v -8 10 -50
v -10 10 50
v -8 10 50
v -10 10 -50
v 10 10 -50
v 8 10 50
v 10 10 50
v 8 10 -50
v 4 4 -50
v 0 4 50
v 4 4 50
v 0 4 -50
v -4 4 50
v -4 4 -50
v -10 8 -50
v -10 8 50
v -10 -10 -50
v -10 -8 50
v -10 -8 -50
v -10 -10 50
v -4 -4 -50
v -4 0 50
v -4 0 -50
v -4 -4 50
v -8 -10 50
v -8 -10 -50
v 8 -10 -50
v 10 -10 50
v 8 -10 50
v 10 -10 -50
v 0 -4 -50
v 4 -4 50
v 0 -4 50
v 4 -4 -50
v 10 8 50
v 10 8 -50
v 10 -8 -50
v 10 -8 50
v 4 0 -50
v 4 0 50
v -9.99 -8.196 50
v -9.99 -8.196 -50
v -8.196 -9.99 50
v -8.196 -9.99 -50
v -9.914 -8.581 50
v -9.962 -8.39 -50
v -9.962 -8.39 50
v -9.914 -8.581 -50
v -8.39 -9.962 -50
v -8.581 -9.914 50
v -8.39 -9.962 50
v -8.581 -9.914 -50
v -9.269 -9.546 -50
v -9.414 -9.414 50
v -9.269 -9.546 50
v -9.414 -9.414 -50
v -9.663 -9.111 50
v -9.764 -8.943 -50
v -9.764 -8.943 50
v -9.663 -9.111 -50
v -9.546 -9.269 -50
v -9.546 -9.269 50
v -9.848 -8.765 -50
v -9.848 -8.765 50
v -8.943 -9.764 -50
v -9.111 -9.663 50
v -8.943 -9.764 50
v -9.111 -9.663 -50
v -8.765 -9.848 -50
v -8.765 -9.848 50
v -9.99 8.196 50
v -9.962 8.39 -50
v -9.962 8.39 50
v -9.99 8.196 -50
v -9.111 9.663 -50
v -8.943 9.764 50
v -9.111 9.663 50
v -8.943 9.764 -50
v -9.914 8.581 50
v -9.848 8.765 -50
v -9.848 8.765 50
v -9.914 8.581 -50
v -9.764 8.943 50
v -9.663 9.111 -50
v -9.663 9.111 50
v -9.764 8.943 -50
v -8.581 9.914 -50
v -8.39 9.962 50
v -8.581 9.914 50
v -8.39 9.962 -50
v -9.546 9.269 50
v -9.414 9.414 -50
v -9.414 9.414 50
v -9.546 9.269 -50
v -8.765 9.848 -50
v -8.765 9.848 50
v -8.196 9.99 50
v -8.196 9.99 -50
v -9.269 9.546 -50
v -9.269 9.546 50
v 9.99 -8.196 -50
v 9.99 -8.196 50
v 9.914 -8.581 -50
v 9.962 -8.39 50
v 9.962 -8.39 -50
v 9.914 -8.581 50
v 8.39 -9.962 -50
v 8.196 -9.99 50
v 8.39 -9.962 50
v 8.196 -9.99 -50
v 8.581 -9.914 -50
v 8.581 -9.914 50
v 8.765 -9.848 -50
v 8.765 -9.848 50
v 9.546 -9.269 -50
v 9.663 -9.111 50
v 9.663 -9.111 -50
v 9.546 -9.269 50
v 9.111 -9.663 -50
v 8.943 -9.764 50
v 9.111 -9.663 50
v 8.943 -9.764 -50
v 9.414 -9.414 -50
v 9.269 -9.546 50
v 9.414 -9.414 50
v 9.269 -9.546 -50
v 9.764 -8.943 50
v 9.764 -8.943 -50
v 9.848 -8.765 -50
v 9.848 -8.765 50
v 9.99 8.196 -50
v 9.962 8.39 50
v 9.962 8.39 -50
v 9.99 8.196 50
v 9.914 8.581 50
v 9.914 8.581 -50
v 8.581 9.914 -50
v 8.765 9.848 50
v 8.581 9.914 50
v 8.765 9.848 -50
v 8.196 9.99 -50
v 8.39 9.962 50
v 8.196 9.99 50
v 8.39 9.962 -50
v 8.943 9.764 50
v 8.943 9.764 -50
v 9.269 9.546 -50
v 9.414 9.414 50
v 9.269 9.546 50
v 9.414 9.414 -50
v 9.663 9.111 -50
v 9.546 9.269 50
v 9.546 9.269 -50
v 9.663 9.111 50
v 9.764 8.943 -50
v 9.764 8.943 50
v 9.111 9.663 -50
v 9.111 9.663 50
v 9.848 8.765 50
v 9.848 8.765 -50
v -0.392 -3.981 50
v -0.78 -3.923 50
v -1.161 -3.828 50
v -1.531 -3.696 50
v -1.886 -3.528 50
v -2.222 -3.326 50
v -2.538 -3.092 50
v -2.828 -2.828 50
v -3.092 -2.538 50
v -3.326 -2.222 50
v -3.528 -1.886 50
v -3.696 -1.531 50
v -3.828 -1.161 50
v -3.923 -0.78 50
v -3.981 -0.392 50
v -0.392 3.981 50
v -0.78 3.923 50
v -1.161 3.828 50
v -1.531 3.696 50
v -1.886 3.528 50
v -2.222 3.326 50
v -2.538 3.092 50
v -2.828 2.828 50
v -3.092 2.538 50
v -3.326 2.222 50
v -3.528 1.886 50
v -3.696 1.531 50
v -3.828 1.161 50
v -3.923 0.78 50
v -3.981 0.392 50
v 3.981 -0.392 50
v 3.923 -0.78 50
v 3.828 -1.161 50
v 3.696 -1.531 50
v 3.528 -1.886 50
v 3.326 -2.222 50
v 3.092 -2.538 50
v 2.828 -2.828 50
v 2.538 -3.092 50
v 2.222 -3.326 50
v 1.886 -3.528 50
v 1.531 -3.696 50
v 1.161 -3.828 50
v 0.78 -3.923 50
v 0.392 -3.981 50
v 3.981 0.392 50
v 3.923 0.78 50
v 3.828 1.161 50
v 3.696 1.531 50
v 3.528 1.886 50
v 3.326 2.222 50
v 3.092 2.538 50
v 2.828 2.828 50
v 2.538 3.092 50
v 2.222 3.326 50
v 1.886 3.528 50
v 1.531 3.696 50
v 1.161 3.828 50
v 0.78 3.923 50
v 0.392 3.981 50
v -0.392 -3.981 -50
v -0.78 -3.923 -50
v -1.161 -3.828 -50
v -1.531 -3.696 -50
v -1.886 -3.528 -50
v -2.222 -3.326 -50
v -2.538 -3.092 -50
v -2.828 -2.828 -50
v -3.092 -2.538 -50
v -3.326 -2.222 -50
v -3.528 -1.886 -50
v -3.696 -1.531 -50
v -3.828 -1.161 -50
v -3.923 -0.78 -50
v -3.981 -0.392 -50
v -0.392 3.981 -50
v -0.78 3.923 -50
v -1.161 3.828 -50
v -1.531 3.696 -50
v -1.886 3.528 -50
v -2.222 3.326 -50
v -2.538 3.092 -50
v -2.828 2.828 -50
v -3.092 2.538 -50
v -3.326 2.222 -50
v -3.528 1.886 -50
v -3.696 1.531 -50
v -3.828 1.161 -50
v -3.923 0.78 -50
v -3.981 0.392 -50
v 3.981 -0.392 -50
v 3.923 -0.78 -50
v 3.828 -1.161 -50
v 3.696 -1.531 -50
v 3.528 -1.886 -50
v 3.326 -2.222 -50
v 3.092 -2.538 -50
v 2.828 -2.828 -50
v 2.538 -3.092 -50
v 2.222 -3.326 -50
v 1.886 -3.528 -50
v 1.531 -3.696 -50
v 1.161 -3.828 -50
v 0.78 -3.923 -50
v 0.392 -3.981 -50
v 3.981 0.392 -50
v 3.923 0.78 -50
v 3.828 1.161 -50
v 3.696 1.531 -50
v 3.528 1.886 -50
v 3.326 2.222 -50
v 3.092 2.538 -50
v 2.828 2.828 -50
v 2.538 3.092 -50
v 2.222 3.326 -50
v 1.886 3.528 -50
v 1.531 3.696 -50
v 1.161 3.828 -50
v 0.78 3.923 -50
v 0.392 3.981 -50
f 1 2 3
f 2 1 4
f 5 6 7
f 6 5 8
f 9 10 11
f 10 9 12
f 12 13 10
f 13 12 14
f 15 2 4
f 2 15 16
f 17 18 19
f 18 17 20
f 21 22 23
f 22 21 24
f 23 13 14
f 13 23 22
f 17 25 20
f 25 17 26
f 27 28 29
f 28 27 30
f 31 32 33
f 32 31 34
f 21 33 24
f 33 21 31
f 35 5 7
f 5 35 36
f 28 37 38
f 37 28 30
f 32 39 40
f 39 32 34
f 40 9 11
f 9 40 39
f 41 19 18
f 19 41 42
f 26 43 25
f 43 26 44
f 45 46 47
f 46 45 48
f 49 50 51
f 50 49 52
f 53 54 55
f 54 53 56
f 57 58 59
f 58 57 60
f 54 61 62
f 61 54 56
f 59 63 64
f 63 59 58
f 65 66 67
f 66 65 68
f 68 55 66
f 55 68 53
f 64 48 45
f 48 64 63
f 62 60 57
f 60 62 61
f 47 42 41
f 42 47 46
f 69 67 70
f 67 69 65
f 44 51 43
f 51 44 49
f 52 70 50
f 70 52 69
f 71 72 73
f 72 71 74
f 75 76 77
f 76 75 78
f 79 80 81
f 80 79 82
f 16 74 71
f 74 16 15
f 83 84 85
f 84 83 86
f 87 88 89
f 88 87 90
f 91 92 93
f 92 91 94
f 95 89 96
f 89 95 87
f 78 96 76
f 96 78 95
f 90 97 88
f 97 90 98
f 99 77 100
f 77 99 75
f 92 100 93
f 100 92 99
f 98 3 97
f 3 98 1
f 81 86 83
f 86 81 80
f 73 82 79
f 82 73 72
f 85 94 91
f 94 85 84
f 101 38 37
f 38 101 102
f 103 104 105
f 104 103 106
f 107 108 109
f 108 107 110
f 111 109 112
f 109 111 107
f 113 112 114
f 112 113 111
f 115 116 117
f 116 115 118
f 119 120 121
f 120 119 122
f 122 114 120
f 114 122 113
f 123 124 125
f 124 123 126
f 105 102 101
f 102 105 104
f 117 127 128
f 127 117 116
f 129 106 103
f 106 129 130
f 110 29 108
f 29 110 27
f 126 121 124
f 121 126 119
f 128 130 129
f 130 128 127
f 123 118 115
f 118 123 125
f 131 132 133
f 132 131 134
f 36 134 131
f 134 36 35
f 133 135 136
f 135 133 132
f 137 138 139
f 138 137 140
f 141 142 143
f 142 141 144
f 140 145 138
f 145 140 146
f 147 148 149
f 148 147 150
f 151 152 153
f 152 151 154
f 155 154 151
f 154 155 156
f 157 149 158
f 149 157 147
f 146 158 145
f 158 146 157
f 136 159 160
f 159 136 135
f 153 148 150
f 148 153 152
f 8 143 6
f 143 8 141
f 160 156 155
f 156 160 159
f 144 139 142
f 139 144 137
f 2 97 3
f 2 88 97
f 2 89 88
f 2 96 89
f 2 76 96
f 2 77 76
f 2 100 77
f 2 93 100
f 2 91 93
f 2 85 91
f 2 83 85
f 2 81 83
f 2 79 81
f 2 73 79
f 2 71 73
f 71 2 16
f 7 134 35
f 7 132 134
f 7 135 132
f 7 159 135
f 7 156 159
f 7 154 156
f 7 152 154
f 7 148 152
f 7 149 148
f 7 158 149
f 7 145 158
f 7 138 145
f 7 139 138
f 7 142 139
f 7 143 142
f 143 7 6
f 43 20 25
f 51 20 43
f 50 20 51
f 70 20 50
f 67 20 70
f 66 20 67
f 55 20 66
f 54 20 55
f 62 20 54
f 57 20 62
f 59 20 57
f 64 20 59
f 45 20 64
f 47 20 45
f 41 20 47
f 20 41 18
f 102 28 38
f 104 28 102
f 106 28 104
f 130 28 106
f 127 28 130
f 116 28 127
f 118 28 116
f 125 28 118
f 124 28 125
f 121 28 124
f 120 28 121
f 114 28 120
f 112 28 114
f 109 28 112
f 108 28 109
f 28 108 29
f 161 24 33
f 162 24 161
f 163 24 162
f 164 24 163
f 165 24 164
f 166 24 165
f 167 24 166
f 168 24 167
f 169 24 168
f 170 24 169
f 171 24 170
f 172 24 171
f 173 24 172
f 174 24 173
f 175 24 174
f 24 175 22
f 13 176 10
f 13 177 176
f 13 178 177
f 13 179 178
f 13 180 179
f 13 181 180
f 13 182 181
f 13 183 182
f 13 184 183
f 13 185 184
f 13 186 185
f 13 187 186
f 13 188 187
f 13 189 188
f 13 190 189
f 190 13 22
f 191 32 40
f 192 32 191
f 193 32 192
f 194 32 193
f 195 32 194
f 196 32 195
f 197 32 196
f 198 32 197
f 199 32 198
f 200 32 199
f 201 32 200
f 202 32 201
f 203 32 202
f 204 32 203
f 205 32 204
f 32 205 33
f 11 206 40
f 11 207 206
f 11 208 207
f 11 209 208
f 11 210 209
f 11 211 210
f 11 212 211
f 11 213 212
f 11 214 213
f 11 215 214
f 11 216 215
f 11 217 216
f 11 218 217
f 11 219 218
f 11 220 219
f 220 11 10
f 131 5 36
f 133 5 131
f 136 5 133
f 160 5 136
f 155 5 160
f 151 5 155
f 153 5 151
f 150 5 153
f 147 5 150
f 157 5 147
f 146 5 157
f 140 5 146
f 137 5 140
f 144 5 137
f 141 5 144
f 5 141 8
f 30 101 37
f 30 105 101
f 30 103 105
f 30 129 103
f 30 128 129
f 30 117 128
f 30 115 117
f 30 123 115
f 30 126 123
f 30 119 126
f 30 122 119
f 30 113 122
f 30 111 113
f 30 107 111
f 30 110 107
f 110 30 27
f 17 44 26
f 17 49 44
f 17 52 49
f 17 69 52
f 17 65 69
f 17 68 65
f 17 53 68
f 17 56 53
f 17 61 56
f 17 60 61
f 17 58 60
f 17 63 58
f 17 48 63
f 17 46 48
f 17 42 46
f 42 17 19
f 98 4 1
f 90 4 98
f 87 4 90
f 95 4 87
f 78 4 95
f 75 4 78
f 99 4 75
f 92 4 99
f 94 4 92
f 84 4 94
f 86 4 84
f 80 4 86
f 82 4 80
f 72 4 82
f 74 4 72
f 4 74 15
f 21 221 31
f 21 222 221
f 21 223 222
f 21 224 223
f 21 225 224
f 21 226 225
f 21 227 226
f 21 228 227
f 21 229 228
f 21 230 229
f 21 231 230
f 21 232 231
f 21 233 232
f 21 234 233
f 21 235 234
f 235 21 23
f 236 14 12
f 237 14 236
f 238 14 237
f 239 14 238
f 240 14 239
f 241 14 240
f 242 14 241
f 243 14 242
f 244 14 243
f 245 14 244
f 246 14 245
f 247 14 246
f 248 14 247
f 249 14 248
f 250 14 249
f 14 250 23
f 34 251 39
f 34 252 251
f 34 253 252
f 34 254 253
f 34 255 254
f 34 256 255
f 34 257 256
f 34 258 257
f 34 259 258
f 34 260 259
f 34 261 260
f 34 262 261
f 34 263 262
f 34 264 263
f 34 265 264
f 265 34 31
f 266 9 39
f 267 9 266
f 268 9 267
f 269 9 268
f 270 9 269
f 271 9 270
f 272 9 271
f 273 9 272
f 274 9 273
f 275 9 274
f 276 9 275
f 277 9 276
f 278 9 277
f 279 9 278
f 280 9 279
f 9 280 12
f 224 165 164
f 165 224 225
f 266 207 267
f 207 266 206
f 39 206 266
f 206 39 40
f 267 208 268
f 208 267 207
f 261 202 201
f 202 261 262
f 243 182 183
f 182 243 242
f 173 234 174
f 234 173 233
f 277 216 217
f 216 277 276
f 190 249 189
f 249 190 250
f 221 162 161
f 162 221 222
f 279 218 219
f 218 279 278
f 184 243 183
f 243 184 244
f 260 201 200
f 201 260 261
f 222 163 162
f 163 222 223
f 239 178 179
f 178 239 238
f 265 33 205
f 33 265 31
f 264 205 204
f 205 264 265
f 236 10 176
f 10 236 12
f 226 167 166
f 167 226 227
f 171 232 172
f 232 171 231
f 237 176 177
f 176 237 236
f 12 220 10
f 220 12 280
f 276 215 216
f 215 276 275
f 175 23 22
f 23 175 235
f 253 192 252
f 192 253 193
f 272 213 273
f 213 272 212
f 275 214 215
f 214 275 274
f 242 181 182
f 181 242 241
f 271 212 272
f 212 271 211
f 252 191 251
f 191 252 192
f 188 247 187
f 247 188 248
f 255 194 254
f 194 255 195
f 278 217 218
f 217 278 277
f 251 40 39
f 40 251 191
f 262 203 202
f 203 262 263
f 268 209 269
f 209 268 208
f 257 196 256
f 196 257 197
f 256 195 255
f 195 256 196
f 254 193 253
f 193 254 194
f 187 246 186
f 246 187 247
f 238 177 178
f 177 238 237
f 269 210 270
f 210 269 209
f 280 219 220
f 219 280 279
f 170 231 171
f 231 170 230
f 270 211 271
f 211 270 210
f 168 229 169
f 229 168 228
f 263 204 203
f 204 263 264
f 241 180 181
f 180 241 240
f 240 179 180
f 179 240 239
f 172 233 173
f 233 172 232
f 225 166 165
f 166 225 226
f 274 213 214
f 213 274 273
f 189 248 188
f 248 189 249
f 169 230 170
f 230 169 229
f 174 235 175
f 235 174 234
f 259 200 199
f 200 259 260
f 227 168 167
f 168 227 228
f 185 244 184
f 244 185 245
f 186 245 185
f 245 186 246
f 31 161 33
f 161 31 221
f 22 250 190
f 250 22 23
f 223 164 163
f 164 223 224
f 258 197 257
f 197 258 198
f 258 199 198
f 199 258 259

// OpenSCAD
$fn=64;

module tslot2020_profile(len=100, size=20, slot=6, wall=2, core=8) {
    difference() {
        translate([0,0,0]) cube([size, size, len], center=true);

        // central bore
        cylinder(h=len+0.2, d=core, center=true);

        // T-slots on four sides (simple rectangular approximation)
        for (a = [0,90,180,270]) {
            rotate([0,0,a]) translate([0, size/2 - slot/2, 0])
                cube([size - 2*wall, slot, len+0.2], center=true);
        }

        // corner reliefs to suggest extrusion geometry
        for (sx=[-1,1], sy=[-1,1]) {
            translate([sx*(size/2 - wall), sy*(size/2 - wall), 0])
                cylinder(h=len+0.2, r=wall, center=true);
        }
    }
}

tslot2020_profile(len=100, size=20, slot=6, wall=2, core=8);
